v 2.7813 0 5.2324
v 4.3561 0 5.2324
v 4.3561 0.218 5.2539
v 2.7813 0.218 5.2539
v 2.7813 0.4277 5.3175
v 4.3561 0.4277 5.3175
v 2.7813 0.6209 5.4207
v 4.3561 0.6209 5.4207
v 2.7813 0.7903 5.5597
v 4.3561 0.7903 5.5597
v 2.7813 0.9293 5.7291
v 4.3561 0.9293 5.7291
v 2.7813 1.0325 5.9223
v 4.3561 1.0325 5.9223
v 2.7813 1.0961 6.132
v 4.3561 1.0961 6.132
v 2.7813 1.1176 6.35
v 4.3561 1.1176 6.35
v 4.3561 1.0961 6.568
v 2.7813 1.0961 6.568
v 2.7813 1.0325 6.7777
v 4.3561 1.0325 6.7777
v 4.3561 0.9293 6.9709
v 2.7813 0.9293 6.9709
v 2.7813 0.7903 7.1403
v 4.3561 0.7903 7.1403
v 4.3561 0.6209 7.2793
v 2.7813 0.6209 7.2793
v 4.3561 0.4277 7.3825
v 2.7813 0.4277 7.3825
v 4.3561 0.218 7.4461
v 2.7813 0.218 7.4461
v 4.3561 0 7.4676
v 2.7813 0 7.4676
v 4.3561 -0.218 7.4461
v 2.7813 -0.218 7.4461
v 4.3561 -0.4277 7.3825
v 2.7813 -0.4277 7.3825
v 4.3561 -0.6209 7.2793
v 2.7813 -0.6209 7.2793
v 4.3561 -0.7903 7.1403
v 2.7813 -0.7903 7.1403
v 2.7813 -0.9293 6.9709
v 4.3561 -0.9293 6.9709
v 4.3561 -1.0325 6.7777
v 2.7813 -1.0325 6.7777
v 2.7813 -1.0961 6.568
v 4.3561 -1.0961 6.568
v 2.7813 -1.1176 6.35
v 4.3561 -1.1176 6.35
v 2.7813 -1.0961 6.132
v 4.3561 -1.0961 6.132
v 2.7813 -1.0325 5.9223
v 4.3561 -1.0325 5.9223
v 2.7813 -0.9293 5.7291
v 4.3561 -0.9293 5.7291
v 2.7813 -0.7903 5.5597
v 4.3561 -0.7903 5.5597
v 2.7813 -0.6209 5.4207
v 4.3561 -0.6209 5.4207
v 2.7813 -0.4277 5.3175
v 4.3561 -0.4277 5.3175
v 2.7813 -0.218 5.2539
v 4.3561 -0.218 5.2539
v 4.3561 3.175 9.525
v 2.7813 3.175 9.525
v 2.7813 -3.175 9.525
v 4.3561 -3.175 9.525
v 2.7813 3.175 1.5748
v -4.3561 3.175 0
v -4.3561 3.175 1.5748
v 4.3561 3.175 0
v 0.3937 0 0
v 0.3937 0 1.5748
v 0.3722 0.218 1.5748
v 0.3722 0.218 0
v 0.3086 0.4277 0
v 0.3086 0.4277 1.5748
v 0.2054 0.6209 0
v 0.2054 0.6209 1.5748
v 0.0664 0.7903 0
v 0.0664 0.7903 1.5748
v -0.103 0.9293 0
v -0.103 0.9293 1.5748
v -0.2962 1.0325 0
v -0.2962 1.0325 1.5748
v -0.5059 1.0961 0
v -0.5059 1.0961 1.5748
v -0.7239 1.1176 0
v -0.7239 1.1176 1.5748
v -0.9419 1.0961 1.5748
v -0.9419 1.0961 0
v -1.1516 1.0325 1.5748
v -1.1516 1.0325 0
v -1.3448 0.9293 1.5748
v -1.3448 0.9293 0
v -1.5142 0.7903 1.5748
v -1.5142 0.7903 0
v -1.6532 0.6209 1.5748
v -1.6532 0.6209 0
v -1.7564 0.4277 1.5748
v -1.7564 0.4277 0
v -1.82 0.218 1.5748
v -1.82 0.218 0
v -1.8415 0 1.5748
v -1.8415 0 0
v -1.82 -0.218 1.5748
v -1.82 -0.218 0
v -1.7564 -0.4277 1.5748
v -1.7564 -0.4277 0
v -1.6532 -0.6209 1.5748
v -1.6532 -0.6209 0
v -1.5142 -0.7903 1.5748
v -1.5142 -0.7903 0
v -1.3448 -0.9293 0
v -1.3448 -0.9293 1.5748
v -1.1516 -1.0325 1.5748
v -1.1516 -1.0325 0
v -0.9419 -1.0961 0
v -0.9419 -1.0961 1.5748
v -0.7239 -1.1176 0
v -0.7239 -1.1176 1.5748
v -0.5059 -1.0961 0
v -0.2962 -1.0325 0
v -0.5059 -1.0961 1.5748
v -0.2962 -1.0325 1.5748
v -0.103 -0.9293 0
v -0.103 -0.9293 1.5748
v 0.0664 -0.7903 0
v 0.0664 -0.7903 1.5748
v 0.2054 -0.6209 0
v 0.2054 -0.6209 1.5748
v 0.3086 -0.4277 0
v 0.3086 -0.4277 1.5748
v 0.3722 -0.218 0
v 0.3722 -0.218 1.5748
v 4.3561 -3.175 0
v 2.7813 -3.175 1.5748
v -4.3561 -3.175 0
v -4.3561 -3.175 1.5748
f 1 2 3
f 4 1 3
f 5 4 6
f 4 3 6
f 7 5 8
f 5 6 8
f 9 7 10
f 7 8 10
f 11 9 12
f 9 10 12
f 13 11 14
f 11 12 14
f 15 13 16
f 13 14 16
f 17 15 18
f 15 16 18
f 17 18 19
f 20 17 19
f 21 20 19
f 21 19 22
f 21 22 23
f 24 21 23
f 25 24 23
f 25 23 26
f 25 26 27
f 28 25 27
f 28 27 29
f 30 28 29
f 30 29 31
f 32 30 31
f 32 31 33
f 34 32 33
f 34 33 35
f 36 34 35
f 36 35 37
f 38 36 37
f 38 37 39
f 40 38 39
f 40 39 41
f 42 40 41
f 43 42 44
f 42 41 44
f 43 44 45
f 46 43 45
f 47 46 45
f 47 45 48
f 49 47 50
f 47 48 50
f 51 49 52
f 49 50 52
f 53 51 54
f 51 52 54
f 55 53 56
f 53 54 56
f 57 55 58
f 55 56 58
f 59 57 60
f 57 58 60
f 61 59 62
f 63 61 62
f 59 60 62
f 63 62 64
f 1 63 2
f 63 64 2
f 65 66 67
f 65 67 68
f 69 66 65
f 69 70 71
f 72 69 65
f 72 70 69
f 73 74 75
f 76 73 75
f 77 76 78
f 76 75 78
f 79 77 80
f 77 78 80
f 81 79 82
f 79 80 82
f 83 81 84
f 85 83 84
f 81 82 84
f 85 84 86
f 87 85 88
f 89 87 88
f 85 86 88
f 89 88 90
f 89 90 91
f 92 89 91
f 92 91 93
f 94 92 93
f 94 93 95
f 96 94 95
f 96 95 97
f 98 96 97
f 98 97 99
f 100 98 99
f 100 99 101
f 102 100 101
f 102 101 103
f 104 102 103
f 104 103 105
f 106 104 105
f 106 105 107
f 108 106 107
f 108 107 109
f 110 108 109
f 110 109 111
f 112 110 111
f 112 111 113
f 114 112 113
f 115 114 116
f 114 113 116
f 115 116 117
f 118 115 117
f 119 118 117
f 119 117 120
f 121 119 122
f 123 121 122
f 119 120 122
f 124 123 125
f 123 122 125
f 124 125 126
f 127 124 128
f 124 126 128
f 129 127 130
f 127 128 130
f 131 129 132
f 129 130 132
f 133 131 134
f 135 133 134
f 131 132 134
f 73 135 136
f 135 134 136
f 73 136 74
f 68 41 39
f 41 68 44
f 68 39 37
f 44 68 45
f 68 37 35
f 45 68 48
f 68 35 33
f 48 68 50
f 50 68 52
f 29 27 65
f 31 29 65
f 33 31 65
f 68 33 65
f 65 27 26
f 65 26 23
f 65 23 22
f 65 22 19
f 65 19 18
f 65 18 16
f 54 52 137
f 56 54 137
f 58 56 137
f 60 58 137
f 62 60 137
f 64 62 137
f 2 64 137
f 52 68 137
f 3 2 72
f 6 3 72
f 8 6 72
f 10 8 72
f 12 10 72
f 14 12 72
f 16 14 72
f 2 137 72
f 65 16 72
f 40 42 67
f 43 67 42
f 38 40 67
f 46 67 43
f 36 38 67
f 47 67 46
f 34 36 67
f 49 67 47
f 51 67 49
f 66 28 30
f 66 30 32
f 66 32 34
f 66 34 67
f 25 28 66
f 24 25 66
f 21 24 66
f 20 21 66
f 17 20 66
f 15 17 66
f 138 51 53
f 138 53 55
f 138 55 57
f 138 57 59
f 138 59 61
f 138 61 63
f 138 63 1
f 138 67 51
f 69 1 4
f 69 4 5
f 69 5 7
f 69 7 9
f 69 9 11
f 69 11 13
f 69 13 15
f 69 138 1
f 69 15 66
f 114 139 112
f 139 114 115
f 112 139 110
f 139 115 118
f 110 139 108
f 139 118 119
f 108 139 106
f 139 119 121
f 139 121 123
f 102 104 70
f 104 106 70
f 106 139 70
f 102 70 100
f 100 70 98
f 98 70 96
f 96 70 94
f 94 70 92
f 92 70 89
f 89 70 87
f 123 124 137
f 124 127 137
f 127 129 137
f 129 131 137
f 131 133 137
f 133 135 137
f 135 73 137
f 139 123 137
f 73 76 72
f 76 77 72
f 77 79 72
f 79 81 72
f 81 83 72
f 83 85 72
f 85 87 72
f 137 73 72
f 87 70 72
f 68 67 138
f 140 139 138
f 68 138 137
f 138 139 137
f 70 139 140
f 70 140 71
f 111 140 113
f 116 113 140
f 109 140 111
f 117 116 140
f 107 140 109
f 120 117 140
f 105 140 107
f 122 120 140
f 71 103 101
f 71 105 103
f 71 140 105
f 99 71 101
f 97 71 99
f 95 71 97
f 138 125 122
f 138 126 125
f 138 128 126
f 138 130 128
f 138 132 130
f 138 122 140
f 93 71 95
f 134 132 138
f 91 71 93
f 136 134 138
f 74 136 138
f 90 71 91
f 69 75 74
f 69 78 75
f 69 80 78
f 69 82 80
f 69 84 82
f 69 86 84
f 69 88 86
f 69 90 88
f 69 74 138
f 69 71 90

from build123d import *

# Parameters (mm, degrees)
SKETCH1_W           = 8.7122
SKETCH1_H           = 6.35
BOSS_EXTRUDE1_DEPTH = 1.5748
SKETCH2_W           = 1.5748
SKETCH2_H           = 6.35
BOSS_EXTRUDE2_DEPTH = 7.9502
SKETCH3_R           = 1.1176
CUT_EXTRUDE1_DEPTH  = 2.5748
SKETCH4_R           = 1.1176
CUT_EXTRUDE2_DEPTH  = 9.7122


with BuildPart() as part:
    # Sketch1 → Boss-Extrude1 (new body)
    with BuildSketch(Plane.XY):
        Rectangle(SKETCH1_W, SKETCH1_H)
    extrude(amount=BOSS_EXTRUDE1_DEPTH)

    # Sketch2 → Boss-Extrude2 (add)
    with BuildSketch(Plane.XY.offset(1.5748)):
        with Locations((3.5687, 0)):
            Rectangle(SKETCH2_W, SKETCH2_H)
    extrude(amount=BOSS_EXTRUDE2_DEPTH)

    # Sketch3 → Cut-Extrude1 (cut, through all)
    with BuildSketch(Plane.XY.offset(1.5748)):
        with Locations((-0.7239, 0)):
            Circle(SKETCH3_R)
    extrude(amount=-CUT_EXTRUDE1_DEPTH, mode=Mode.SUBTRACT)

    # Sketch4 → Cut-Extrude2 (cut, through all)
    with BuildSketch(Plane(origin=(4.3561, 0, 0), x_dir=(0, 0, -1), z_dir=(1, 0, 0))):
        with Locations((-6.35, 0)):
            Circle(SKETCH4_R)
    extrude(amount=-CUT_EXTRUDE2_DEPTH, mode=Mode.SUBTRACT)


solid = part.part
